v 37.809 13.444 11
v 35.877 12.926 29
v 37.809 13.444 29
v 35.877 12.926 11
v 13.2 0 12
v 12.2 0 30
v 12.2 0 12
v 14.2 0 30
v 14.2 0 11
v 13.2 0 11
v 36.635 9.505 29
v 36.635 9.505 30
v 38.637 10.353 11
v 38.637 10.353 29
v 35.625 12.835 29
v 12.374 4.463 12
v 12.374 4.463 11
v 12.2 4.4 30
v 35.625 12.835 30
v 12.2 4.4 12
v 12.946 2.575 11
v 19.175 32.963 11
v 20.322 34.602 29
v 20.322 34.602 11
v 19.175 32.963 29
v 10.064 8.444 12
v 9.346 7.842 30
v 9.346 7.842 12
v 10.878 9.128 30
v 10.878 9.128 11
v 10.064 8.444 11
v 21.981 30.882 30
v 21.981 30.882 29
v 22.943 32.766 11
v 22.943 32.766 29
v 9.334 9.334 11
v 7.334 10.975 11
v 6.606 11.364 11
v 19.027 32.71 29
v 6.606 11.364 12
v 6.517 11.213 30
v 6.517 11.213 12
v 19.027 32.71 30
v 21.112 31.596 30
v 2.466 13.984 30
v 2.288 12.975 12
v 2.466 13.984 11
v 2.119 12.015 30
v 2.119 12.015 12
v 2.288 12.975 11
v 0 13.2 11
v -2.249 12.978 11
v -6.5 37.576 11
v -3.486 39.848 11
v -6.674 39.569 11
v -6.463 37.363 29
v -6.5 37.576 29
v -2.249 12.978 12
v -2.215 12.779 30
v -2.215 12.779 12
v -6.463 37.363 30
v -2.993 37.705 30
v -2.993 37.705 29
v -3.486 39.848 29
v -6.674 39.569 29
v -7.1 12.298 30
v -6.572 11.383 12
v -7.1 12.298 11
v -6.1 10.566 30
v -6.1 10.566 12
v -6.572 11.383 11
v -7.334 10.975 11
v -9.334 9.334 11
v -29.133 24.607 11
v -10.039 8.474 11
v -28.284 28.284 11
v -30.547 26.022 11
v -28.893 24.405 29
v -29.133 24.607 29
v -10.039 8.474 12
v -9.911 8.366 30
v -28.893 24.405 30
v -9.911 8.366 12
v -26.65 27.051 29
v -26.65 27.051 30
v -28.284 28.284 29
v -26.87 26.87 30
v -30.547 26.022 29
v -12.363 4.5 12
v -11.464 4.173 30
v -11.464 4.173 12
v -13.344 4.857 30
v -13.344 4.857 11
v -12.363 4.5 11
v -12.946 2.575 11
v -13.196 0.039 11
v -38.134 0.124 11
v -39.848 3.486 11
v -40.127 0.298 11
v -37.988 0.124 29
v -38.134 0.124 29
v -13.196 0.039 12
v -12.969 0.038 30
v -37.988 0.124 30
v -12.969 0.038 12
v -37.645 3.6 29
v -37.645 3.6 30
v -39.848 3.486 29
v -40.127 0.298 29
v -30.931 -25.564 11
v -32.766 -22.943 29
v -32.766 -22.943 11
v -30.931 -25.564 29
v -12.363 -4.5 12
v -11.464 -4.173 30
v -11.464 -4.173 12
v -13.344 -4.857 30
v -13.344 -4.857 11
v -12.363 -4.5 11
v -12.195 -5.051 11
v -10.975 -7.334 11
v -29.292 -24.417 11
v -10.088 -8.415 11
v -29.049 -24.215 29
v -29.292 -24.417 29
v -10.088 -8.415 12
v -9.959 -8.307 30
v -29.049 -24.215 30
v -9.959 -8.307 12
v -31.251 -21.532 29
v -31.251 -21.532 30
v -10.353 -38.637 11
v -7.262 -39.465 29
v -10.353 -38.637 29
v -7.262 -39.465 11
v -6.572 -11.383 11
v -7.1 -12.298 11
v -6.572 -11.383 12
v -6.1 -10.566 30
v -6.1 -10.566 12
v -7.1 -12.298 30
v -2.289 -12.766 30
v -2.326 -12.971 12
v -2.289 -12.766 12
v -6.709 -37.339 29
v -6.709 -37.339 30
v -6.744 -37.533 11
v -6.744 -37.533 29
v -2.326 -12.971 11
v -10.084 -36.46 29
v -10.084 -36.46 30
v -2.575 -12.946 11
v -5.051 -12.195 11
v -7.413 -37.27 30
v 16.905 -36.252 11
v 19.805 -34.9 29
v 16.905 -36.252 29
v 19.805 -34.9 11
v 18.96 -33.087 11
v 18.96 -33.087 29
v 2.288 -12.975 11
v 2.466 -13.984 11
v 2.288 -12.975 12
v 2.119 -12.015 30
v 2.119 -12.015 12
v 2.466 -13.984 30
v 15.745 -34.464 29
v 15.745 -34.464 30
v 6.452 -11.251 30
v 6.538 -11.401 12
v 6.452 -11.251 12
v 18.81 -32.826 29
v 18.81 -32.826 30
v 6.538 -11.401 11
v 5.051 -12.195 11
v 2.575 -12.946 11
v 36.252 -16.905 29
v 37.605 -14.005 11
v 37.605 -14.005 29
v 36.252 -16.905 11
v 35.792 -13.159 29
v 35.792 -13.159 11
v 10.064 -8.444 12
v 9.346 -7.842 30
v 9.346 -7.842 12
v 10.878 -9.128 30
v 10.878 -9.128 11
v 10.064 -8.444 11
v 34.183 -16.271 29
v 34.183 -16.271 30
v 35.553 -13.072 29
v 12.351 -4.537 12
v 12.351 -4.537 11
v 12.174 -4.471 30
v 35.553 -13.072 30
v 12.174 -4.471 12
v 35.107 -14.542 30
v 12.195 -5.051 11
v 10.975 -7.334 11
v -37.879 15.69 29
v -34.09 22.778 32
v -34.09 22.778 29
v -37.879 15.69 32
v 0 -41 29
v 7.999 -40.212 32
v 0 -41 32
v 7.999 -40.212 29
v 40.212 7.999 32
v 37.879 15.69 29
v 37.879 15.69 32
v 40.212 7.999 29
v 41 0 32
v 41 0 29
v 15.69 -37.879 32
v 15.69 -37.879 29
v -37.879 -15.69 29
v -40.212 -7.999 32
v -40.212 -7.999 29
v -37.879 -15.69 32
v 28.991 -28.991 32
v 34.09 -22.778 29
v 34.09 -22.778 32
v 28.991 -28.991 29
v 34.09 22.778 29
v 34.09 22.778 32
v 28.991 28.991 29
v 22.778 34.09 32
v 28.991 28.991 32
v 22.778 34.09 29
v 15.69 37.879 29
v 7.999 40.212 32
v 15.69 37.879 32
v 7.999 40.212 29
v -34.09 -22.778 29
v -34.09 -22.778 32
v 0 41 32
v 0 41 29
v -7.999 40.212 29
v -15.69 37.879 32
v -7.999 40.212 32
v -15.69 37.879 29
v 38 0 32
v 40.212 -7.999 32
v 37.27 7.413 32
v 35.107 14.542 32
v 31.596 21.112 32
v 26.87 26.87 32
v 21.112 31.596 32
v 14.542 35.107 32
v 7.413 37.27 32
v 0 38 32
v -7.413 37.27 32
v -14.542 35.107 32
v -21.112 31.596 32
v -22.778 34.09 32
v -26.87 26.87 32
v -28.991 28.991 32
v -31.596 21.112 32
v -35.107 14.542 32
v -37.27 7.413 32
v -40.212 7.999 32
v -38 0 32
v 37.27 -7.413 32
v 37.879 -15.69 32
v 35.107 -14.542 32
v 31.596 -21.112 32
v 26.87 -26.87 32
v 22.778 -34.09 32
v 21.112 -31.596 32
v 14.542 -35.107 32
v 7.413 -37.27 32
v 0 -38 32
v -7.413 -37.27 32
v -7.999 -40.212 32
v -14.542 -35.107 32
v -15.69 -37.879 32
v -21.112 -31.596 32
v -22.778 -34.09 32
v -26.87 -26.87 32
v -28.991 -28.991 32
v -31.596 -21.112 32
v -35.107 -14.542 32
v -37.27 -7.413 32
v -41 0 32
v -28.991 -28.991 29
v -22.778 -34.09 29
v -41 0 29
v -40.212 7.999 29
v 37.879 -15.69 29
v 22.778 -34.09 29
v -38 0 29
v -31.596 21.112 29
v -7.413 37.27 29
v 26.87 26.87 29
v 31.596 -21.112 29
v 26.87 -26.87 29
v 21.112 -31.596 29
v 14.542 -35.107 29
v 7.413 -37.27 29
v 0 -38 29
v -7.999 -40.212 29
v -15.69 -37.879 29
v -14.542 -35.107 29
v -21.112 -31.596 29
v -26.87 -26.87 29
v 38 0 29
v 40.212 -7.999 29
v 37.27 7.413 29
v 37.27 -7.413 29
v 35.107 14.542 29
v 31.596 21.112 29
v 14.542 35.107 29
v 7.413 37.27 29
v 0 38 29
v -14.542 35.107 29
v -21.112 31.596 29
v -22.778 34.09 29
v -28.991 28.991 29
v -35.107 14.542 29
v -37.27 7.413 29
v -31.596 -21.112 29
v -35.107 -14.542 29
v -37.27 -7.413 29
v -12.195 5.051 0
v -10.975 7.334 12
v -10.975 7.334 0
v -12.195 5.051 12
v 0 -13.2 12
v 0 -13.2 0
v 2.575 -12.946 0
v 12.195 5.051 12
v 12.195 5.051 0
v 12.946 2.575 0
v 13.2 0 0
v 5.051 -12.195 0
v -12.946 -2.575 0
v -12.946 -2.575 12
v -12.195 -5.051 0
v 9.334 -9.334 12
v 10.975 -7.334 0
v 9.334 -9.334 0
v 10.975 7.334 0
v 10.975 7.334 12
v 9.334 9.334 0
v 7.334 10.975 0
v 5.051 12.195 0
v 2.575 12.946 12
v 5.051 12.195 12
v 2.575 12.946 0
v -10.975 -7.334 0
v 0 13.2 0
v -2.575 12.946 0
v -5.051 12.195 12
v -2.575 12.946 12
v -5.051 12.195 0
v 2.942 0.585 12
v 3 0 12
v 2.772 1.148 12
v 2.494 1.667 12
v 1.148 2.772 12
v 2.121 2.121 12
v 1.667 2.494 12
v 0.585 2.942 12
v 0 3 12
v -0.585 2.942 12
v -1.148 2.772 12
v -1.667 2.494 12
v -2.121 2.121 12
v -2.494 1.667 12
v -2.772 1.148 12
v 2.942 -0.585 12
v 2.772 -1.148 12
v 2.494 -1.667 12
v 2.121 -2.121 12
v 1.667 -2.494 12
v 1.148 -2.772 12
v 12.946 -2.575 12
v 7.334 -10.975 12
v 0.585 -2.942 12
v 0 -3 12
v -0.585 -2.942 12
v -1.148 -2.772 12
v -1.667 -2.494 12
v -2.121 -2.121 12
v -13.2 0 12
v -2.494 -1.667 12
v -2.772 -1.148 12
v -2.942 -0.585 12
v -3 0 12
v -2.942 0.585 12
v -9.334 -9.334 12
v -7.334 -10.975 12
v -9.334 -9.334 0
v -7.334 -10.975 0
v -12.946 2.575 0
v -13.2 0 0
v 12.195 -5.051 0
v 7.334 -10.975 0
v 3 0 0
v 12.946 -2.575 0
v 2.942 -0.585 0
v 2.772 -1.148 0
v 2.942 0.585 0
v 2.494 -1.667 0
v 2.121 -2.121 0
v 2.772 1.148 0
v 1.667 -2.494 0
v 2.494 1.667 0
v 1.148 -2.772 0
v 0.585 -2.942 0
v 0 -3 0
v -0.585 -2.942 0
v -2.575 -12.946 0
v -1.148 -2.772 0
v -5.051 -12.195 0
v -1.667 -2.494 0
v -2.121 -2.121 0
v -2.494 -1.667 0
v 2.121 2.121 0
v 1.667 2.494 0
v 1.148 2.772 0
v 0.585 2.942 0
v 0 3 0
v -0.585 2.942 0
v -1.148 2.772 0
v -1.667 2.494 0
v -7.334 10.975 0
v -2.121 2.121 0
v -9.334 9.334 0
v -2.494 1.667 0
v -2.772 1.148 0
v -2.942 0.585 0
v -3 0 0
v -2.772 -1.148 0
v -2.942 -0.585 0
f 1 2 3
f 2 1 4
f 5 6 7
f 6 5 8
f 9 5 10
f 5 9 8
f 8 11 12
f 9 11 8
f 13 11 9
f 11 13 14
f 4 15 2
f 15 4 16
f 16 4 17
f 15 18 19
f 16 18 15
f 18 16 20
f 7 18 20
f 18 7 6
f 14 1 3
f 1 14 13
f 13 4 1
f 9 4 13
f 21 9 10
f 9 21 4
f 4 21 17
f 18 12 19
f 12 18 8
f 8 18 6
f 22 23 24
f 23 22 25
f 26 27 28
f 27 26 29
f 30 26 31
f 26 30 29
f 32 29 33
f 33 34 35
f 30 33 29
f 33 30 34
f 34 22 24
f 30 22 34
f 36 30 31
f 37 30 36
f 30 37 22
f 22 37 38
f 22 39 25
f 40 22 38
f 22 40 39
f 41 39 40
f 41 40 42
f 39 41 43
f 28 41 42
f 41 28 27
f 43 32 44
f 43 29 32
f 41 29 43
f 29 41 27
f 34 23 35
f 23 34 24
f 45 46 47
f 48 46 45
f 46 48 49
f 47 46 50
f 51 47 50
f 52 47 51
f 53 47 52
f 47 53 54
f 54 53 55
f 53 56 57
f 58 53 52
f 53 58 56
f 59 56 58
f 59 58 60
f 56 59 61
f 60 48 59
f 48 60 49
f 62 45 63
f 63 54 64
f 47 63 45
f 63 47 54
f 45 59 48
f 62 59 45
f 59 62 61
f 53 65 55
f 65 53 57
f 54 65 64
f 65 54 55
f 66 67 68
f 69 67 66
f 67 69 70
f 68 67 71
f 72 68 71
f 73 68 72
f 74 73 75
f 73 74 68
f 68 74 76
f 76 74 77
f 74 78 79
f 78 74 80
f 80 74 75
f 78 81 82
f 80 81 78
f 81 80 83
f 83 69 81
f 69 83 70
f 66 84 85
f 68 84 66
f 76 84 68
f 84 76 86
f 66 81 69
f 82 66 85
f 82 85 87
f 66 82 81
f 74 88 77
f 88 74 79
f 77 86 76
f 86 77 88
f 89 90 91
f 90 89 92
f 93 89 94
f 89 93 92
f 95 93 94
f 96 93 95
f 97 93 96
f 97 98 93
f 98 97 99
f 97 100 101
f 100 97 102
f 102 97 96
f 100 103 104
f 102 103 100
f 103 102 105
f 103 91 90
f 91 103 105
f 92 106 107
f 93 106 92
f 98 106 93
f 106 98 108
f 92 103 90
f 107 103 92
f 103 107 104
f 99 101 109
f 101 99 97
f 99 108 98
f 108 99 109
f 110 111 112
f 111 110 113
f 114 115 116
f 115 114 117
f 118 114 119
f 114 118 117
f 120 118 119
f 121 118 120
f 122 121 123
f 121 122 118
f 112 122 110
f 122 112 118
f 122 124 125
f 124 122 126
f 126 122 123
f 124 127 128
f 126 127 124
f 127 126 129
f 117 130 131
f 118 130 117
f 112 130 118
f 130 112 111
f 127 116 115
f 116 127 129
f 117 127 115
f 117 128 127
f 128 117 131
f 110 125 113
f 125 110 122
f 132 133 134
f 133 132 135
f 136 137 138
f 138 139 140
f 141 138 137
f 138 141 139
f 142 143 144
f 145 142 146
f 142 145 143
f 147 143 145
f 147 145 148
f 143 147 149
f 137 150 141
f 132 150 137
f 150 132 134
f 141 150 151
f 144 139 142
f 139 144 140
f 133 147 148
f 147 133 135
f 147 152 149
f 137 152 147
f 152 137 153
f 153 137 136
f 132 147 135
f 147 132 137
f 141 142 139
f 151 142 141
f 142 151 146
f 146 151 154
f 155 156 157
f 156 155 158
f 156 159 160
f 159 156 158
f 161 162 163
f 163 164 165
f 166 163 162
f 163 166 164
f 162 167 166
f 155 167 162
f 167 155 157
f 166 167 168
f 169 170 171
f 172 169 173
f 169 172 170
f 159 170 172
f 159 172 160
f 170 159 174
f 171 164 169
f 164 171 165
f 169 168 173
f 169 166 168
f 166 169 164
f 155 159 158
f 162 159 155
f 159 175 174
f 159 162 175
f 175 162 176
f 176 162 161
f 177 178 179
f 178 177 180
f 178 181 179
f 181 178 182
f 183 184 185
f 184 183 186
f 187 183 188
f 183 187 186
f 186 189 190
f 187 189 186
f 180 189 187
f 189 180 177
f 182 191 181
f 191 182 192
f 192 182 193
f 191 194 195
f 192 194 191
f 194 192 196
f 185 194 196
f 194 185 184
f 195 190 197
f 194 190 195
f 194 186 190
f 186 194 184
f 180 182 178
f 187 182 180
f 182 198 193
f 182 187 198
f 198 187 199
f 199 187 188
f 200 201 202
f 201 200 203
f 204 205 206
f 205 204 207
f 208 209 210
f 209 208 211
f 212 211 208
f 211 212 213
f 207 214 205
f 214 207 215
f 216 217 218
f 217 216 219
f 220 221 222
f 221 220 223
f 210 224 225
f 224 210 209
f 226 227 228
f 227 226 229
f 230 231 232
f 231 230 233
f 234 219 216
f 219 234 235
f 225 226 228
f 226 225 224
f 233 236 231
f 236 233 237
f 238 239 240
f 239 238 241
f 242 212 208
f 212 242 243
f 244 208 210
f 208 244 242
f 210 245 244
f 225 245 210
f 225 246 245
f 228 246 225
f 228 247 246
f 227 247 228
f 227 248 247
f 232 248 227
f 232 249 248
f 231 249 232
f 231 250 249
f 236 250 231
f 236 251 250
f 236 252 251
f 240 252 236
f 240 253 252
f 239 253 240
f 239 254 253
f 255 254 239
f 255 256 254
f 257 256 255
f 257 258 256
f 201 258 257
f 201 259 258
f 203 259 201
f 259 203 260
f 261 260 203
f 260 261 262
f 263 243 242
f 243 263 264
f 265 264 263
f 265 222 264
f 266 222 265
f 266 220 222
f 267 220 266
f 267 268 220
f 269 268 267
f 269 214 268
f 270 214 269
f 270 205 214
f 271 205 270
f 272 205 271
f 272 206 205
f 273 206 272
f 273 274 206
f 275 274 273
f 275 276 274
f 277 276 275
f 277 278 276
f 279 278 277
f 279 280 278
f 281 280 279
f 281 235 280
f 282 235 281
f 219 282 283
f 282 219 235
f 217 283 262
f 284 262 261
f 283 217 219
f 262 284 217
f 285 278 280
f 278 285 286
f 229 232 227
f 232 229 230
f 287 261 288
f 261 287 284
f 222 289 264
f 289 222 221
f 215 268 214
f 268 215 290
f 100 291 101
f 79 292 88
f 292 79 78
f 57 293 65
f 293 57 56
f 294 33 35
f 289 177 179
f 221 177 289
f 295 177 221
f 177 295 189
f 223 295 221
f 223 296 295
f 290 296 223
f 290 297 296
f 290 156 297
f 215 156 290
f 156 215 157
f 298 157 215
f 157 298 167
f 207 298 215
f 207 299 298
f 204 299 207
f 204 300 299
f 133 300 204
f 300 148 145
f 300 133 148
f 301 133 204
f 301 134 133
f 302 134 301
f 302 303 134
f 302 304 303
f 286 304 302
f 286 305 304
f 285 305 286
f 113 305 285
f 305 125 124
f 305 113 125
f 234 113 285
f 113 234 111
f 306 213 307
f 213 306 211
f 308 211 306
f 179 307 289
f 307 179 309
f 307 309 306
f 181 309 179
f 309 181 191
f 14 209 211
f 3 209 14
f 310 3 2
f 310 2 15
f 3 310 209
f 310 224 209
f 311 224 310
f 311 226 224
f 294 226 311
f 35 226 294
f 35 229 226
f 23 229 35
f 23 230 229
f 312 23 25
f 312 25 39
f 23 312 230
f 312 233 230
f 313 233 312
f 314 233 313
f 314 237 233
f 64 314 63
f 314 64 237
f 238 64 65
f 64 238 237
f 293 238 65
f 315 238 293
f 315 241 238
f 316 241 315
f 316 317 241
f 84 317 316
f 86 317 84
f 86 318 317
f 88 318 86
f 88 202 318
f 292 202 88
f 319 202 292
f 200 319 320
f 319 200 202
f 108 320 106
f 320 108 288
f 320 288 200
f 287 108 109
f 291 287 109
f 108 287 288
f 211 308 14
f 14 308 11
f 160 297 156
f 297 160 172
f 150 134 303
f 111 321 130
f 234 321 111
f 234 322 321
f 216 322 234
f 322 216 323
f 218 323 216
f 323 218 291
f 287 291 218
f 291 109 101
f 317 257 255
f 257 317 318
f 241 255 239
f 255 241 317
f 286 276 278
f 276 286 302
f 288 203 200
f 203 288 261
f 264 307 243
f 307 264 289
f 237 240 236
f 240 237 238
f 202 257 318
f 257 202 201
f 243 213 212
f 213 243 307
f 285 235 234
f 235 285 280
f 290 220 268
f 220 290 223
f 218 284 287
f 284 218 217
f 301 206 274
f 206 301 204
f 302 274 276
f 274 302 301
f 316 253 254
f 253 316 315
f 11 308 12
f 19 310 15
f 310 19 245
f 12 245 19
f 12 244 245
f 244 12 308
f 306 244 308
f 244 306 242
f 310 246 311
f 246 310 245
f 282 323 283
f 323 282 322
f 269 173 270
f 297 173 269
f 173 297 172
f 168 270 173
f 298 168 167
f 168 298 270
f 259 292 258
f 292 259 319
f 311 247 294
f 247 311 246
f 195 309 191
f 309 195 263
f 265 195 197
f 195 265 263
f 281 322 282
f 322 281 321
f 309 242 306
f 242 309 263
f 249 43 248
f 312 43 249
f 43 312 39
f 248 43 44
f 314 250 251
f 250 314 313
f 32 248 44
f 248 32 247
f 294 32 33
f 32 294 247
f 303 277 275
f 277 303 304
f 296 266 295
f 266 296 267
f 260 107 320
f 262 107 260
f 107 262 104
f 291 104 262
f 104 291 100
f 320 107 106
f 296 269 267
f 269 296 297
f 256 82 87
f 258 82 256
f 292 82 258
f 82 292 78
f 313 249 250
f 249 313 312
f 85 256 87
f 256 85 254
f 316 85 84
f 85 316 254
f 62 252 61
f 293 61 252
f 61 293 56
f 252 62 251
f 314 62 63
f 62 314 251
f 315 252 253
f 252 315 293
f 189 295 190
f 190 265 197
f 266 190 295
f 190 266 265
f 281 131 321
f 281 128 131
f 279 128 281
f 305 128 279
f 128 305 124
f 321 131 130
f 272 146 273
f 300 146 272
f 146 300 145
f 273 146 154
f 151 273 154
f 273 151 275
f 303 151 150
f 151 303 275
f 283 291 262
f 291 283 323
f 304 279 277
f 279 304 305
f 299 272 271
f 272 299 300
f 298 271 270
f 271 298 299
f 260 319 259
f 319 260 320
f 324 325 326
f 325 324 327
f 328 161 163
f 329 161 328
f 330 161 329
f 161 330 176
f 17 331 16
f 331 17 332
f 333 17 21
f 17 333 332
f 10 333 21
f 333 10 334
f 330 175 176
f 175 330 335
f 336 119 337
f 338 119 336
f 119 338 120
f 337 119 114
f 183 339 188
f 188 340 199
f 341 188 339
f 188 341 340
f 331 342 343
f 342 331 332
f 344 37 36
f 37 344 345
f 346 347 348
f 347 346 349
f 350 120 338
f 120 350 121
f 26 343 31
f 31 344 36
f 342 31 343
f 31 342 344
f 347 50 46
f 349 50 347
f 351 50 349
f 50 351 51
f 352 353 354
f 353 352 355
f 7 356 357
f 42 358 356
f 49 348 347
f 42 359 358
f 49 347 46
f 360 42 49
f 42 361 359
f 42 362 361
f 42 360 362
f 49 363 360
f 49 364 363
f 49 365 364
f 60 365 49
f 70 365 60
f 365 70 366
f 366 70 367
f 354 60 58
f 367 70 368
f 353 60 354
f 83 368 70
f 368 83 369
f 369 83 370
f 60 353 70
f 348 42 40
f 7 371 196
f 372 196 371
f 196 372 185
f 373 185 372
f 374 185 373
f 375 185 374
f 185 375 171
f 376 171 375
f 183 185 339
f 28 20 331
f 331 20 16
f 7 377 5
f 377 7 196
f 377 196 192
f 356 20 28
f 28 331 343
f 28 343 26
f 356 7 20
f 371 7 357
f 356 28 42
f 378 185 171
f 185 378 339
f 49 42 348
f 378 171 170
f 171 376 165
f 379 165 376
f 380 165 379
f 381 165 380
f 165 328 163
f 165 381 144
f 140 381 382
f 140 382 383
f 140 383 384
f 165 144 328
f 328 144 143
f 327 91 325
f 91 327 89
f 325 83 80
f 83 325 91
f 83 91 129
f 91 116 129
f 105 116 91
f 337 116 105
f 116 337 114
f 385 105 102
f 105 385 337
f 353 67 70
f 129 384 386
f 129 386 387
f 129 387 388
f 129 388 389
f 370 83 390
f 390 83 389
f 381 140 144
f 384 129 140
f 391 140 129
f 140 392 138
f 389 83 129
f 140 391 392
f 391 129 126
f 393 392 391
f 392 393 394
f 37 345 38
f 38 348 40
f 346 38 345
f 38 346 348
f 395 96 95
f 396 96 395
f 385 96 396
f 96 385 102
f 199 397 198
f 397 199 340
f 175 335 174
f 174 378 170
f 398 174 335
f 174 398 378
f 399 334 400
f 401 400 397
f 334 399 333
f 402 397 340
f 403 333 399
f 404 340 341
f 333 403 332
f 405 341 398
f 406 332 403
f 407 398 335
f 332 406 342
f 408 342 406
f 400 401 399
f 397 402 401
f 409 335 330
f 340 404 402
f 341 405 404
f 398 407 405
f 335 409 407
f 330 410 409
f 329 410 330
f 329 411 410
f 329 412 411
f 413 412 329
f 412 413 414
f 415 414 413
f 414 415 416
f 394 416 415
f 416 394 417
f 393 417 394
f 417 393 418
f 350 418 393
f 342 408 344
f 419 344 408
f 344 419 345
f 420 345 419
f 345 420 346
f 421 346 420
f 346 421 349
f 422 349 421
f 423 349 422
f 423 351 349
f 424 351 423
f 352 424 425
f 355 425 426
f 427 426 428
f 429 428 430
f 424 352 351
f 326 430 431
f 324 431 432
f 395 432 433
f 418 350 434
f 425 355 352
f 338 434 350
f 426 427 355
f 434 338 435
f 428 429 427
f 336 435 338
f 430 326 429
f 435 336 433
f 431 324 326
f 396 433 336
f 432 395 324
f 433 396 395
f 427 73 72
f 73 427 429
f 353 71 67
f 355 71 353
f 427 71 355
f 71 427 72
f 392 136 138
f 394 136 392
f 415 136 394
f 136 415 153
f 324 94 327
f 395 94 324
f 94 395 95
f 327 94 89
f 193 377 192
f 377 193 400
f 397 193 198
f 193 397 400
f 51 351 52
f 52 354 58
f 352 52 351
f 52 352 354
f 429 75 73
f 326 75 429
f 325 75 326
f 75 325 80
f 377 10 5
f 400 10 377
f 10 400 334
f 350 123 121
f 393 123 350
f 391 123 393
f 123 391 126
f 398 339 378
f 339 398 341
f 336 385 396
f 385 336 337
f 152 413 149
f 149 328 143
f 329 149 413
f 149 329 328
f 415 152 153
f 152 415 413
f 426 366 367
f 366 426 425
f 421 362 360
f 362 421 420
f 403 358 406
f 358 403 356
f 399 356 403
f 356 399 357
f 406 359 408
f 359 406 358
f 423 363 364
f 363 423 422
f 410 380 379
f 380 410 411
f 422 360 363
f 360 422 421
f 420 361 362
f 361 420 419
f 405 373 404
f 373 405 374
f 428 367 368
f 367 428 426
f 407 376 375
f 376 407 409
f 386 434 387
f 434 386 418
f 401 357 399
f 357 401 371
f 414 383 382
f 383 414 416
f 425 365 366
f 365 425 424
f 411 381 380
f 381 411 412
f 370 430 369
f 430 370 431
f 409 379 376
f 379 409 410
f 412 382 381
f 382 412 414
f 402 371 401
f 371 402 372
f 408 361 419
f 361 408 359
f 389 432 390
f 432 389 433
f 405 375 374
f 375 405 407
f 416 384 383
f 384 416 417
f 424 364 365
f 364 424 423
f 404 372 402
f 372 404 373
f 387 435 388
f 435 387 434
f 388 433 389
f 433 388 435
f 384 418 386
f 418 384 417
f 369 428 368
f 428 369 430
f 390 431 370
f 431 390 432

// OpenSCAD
$fn = 32;

// ----------------------------------------------------------------------
// Impeller: 80 mm, 9 blades, 32 mm tall
// ----------------------------------------------------------------------

// --- parameters (mm) ---
center_d = 26.4;          // hub diameter
center_h = 12;            // hub height
wheel_d = 80;             // outer diameter over the blades
blade_count = 9;          // number of blades
blade_t = 2;              // blade thickness
blade_h = 18;             // blade height
blade_in_r = 12.2;        // blade root radius
blade_out_r = 38;         // blade tip radius
sweep = 15;               // blade sweep, degrees
bore_d = 6;               // shaft bore
shroud_h = 2;             // shroud ring thickness
shroud_d = 82;            // shroud outside diameter

module hub() {
  cylinder(h = center_h, d = center_d);
}

module blade() {
  /* blade swept between two boxes: hull of the root and the tip section */
  hull() {
    translate([blade_in_r, 0, center_h - 1])
      cube([blade_t, blade_t * 2.2, blade_h + 1], center = false);
    rotate([0, 0, sweep])
      translate([blade_out_r, 0, center_h - 1])
        cube([blade_t, blade_t * 1.6, blade_h + 1], center = false);
  }
}

module blades() {
  for (i = [0 : blade_count - 1])
    rotate([0, 0, i * 360 / blade_count]) blade();
}

module shroud() {
  translate([0, 0, center_h + blade_h - 1])
    difference() {
      cylinder(h = shroud_h + 1, d = shroud_d);
      translate([0, 0, -1]) cylinder(h = shroud_h + 3, d = shroud_d - 2 * 3);
    }
}

difference() {
  union() {
    hub();
    blades();
    shroud();
  }
  translate([0, 0, -1]) cylinder(h = center_h + blade_h + shroud_h + 3, d = bore_d);
}
